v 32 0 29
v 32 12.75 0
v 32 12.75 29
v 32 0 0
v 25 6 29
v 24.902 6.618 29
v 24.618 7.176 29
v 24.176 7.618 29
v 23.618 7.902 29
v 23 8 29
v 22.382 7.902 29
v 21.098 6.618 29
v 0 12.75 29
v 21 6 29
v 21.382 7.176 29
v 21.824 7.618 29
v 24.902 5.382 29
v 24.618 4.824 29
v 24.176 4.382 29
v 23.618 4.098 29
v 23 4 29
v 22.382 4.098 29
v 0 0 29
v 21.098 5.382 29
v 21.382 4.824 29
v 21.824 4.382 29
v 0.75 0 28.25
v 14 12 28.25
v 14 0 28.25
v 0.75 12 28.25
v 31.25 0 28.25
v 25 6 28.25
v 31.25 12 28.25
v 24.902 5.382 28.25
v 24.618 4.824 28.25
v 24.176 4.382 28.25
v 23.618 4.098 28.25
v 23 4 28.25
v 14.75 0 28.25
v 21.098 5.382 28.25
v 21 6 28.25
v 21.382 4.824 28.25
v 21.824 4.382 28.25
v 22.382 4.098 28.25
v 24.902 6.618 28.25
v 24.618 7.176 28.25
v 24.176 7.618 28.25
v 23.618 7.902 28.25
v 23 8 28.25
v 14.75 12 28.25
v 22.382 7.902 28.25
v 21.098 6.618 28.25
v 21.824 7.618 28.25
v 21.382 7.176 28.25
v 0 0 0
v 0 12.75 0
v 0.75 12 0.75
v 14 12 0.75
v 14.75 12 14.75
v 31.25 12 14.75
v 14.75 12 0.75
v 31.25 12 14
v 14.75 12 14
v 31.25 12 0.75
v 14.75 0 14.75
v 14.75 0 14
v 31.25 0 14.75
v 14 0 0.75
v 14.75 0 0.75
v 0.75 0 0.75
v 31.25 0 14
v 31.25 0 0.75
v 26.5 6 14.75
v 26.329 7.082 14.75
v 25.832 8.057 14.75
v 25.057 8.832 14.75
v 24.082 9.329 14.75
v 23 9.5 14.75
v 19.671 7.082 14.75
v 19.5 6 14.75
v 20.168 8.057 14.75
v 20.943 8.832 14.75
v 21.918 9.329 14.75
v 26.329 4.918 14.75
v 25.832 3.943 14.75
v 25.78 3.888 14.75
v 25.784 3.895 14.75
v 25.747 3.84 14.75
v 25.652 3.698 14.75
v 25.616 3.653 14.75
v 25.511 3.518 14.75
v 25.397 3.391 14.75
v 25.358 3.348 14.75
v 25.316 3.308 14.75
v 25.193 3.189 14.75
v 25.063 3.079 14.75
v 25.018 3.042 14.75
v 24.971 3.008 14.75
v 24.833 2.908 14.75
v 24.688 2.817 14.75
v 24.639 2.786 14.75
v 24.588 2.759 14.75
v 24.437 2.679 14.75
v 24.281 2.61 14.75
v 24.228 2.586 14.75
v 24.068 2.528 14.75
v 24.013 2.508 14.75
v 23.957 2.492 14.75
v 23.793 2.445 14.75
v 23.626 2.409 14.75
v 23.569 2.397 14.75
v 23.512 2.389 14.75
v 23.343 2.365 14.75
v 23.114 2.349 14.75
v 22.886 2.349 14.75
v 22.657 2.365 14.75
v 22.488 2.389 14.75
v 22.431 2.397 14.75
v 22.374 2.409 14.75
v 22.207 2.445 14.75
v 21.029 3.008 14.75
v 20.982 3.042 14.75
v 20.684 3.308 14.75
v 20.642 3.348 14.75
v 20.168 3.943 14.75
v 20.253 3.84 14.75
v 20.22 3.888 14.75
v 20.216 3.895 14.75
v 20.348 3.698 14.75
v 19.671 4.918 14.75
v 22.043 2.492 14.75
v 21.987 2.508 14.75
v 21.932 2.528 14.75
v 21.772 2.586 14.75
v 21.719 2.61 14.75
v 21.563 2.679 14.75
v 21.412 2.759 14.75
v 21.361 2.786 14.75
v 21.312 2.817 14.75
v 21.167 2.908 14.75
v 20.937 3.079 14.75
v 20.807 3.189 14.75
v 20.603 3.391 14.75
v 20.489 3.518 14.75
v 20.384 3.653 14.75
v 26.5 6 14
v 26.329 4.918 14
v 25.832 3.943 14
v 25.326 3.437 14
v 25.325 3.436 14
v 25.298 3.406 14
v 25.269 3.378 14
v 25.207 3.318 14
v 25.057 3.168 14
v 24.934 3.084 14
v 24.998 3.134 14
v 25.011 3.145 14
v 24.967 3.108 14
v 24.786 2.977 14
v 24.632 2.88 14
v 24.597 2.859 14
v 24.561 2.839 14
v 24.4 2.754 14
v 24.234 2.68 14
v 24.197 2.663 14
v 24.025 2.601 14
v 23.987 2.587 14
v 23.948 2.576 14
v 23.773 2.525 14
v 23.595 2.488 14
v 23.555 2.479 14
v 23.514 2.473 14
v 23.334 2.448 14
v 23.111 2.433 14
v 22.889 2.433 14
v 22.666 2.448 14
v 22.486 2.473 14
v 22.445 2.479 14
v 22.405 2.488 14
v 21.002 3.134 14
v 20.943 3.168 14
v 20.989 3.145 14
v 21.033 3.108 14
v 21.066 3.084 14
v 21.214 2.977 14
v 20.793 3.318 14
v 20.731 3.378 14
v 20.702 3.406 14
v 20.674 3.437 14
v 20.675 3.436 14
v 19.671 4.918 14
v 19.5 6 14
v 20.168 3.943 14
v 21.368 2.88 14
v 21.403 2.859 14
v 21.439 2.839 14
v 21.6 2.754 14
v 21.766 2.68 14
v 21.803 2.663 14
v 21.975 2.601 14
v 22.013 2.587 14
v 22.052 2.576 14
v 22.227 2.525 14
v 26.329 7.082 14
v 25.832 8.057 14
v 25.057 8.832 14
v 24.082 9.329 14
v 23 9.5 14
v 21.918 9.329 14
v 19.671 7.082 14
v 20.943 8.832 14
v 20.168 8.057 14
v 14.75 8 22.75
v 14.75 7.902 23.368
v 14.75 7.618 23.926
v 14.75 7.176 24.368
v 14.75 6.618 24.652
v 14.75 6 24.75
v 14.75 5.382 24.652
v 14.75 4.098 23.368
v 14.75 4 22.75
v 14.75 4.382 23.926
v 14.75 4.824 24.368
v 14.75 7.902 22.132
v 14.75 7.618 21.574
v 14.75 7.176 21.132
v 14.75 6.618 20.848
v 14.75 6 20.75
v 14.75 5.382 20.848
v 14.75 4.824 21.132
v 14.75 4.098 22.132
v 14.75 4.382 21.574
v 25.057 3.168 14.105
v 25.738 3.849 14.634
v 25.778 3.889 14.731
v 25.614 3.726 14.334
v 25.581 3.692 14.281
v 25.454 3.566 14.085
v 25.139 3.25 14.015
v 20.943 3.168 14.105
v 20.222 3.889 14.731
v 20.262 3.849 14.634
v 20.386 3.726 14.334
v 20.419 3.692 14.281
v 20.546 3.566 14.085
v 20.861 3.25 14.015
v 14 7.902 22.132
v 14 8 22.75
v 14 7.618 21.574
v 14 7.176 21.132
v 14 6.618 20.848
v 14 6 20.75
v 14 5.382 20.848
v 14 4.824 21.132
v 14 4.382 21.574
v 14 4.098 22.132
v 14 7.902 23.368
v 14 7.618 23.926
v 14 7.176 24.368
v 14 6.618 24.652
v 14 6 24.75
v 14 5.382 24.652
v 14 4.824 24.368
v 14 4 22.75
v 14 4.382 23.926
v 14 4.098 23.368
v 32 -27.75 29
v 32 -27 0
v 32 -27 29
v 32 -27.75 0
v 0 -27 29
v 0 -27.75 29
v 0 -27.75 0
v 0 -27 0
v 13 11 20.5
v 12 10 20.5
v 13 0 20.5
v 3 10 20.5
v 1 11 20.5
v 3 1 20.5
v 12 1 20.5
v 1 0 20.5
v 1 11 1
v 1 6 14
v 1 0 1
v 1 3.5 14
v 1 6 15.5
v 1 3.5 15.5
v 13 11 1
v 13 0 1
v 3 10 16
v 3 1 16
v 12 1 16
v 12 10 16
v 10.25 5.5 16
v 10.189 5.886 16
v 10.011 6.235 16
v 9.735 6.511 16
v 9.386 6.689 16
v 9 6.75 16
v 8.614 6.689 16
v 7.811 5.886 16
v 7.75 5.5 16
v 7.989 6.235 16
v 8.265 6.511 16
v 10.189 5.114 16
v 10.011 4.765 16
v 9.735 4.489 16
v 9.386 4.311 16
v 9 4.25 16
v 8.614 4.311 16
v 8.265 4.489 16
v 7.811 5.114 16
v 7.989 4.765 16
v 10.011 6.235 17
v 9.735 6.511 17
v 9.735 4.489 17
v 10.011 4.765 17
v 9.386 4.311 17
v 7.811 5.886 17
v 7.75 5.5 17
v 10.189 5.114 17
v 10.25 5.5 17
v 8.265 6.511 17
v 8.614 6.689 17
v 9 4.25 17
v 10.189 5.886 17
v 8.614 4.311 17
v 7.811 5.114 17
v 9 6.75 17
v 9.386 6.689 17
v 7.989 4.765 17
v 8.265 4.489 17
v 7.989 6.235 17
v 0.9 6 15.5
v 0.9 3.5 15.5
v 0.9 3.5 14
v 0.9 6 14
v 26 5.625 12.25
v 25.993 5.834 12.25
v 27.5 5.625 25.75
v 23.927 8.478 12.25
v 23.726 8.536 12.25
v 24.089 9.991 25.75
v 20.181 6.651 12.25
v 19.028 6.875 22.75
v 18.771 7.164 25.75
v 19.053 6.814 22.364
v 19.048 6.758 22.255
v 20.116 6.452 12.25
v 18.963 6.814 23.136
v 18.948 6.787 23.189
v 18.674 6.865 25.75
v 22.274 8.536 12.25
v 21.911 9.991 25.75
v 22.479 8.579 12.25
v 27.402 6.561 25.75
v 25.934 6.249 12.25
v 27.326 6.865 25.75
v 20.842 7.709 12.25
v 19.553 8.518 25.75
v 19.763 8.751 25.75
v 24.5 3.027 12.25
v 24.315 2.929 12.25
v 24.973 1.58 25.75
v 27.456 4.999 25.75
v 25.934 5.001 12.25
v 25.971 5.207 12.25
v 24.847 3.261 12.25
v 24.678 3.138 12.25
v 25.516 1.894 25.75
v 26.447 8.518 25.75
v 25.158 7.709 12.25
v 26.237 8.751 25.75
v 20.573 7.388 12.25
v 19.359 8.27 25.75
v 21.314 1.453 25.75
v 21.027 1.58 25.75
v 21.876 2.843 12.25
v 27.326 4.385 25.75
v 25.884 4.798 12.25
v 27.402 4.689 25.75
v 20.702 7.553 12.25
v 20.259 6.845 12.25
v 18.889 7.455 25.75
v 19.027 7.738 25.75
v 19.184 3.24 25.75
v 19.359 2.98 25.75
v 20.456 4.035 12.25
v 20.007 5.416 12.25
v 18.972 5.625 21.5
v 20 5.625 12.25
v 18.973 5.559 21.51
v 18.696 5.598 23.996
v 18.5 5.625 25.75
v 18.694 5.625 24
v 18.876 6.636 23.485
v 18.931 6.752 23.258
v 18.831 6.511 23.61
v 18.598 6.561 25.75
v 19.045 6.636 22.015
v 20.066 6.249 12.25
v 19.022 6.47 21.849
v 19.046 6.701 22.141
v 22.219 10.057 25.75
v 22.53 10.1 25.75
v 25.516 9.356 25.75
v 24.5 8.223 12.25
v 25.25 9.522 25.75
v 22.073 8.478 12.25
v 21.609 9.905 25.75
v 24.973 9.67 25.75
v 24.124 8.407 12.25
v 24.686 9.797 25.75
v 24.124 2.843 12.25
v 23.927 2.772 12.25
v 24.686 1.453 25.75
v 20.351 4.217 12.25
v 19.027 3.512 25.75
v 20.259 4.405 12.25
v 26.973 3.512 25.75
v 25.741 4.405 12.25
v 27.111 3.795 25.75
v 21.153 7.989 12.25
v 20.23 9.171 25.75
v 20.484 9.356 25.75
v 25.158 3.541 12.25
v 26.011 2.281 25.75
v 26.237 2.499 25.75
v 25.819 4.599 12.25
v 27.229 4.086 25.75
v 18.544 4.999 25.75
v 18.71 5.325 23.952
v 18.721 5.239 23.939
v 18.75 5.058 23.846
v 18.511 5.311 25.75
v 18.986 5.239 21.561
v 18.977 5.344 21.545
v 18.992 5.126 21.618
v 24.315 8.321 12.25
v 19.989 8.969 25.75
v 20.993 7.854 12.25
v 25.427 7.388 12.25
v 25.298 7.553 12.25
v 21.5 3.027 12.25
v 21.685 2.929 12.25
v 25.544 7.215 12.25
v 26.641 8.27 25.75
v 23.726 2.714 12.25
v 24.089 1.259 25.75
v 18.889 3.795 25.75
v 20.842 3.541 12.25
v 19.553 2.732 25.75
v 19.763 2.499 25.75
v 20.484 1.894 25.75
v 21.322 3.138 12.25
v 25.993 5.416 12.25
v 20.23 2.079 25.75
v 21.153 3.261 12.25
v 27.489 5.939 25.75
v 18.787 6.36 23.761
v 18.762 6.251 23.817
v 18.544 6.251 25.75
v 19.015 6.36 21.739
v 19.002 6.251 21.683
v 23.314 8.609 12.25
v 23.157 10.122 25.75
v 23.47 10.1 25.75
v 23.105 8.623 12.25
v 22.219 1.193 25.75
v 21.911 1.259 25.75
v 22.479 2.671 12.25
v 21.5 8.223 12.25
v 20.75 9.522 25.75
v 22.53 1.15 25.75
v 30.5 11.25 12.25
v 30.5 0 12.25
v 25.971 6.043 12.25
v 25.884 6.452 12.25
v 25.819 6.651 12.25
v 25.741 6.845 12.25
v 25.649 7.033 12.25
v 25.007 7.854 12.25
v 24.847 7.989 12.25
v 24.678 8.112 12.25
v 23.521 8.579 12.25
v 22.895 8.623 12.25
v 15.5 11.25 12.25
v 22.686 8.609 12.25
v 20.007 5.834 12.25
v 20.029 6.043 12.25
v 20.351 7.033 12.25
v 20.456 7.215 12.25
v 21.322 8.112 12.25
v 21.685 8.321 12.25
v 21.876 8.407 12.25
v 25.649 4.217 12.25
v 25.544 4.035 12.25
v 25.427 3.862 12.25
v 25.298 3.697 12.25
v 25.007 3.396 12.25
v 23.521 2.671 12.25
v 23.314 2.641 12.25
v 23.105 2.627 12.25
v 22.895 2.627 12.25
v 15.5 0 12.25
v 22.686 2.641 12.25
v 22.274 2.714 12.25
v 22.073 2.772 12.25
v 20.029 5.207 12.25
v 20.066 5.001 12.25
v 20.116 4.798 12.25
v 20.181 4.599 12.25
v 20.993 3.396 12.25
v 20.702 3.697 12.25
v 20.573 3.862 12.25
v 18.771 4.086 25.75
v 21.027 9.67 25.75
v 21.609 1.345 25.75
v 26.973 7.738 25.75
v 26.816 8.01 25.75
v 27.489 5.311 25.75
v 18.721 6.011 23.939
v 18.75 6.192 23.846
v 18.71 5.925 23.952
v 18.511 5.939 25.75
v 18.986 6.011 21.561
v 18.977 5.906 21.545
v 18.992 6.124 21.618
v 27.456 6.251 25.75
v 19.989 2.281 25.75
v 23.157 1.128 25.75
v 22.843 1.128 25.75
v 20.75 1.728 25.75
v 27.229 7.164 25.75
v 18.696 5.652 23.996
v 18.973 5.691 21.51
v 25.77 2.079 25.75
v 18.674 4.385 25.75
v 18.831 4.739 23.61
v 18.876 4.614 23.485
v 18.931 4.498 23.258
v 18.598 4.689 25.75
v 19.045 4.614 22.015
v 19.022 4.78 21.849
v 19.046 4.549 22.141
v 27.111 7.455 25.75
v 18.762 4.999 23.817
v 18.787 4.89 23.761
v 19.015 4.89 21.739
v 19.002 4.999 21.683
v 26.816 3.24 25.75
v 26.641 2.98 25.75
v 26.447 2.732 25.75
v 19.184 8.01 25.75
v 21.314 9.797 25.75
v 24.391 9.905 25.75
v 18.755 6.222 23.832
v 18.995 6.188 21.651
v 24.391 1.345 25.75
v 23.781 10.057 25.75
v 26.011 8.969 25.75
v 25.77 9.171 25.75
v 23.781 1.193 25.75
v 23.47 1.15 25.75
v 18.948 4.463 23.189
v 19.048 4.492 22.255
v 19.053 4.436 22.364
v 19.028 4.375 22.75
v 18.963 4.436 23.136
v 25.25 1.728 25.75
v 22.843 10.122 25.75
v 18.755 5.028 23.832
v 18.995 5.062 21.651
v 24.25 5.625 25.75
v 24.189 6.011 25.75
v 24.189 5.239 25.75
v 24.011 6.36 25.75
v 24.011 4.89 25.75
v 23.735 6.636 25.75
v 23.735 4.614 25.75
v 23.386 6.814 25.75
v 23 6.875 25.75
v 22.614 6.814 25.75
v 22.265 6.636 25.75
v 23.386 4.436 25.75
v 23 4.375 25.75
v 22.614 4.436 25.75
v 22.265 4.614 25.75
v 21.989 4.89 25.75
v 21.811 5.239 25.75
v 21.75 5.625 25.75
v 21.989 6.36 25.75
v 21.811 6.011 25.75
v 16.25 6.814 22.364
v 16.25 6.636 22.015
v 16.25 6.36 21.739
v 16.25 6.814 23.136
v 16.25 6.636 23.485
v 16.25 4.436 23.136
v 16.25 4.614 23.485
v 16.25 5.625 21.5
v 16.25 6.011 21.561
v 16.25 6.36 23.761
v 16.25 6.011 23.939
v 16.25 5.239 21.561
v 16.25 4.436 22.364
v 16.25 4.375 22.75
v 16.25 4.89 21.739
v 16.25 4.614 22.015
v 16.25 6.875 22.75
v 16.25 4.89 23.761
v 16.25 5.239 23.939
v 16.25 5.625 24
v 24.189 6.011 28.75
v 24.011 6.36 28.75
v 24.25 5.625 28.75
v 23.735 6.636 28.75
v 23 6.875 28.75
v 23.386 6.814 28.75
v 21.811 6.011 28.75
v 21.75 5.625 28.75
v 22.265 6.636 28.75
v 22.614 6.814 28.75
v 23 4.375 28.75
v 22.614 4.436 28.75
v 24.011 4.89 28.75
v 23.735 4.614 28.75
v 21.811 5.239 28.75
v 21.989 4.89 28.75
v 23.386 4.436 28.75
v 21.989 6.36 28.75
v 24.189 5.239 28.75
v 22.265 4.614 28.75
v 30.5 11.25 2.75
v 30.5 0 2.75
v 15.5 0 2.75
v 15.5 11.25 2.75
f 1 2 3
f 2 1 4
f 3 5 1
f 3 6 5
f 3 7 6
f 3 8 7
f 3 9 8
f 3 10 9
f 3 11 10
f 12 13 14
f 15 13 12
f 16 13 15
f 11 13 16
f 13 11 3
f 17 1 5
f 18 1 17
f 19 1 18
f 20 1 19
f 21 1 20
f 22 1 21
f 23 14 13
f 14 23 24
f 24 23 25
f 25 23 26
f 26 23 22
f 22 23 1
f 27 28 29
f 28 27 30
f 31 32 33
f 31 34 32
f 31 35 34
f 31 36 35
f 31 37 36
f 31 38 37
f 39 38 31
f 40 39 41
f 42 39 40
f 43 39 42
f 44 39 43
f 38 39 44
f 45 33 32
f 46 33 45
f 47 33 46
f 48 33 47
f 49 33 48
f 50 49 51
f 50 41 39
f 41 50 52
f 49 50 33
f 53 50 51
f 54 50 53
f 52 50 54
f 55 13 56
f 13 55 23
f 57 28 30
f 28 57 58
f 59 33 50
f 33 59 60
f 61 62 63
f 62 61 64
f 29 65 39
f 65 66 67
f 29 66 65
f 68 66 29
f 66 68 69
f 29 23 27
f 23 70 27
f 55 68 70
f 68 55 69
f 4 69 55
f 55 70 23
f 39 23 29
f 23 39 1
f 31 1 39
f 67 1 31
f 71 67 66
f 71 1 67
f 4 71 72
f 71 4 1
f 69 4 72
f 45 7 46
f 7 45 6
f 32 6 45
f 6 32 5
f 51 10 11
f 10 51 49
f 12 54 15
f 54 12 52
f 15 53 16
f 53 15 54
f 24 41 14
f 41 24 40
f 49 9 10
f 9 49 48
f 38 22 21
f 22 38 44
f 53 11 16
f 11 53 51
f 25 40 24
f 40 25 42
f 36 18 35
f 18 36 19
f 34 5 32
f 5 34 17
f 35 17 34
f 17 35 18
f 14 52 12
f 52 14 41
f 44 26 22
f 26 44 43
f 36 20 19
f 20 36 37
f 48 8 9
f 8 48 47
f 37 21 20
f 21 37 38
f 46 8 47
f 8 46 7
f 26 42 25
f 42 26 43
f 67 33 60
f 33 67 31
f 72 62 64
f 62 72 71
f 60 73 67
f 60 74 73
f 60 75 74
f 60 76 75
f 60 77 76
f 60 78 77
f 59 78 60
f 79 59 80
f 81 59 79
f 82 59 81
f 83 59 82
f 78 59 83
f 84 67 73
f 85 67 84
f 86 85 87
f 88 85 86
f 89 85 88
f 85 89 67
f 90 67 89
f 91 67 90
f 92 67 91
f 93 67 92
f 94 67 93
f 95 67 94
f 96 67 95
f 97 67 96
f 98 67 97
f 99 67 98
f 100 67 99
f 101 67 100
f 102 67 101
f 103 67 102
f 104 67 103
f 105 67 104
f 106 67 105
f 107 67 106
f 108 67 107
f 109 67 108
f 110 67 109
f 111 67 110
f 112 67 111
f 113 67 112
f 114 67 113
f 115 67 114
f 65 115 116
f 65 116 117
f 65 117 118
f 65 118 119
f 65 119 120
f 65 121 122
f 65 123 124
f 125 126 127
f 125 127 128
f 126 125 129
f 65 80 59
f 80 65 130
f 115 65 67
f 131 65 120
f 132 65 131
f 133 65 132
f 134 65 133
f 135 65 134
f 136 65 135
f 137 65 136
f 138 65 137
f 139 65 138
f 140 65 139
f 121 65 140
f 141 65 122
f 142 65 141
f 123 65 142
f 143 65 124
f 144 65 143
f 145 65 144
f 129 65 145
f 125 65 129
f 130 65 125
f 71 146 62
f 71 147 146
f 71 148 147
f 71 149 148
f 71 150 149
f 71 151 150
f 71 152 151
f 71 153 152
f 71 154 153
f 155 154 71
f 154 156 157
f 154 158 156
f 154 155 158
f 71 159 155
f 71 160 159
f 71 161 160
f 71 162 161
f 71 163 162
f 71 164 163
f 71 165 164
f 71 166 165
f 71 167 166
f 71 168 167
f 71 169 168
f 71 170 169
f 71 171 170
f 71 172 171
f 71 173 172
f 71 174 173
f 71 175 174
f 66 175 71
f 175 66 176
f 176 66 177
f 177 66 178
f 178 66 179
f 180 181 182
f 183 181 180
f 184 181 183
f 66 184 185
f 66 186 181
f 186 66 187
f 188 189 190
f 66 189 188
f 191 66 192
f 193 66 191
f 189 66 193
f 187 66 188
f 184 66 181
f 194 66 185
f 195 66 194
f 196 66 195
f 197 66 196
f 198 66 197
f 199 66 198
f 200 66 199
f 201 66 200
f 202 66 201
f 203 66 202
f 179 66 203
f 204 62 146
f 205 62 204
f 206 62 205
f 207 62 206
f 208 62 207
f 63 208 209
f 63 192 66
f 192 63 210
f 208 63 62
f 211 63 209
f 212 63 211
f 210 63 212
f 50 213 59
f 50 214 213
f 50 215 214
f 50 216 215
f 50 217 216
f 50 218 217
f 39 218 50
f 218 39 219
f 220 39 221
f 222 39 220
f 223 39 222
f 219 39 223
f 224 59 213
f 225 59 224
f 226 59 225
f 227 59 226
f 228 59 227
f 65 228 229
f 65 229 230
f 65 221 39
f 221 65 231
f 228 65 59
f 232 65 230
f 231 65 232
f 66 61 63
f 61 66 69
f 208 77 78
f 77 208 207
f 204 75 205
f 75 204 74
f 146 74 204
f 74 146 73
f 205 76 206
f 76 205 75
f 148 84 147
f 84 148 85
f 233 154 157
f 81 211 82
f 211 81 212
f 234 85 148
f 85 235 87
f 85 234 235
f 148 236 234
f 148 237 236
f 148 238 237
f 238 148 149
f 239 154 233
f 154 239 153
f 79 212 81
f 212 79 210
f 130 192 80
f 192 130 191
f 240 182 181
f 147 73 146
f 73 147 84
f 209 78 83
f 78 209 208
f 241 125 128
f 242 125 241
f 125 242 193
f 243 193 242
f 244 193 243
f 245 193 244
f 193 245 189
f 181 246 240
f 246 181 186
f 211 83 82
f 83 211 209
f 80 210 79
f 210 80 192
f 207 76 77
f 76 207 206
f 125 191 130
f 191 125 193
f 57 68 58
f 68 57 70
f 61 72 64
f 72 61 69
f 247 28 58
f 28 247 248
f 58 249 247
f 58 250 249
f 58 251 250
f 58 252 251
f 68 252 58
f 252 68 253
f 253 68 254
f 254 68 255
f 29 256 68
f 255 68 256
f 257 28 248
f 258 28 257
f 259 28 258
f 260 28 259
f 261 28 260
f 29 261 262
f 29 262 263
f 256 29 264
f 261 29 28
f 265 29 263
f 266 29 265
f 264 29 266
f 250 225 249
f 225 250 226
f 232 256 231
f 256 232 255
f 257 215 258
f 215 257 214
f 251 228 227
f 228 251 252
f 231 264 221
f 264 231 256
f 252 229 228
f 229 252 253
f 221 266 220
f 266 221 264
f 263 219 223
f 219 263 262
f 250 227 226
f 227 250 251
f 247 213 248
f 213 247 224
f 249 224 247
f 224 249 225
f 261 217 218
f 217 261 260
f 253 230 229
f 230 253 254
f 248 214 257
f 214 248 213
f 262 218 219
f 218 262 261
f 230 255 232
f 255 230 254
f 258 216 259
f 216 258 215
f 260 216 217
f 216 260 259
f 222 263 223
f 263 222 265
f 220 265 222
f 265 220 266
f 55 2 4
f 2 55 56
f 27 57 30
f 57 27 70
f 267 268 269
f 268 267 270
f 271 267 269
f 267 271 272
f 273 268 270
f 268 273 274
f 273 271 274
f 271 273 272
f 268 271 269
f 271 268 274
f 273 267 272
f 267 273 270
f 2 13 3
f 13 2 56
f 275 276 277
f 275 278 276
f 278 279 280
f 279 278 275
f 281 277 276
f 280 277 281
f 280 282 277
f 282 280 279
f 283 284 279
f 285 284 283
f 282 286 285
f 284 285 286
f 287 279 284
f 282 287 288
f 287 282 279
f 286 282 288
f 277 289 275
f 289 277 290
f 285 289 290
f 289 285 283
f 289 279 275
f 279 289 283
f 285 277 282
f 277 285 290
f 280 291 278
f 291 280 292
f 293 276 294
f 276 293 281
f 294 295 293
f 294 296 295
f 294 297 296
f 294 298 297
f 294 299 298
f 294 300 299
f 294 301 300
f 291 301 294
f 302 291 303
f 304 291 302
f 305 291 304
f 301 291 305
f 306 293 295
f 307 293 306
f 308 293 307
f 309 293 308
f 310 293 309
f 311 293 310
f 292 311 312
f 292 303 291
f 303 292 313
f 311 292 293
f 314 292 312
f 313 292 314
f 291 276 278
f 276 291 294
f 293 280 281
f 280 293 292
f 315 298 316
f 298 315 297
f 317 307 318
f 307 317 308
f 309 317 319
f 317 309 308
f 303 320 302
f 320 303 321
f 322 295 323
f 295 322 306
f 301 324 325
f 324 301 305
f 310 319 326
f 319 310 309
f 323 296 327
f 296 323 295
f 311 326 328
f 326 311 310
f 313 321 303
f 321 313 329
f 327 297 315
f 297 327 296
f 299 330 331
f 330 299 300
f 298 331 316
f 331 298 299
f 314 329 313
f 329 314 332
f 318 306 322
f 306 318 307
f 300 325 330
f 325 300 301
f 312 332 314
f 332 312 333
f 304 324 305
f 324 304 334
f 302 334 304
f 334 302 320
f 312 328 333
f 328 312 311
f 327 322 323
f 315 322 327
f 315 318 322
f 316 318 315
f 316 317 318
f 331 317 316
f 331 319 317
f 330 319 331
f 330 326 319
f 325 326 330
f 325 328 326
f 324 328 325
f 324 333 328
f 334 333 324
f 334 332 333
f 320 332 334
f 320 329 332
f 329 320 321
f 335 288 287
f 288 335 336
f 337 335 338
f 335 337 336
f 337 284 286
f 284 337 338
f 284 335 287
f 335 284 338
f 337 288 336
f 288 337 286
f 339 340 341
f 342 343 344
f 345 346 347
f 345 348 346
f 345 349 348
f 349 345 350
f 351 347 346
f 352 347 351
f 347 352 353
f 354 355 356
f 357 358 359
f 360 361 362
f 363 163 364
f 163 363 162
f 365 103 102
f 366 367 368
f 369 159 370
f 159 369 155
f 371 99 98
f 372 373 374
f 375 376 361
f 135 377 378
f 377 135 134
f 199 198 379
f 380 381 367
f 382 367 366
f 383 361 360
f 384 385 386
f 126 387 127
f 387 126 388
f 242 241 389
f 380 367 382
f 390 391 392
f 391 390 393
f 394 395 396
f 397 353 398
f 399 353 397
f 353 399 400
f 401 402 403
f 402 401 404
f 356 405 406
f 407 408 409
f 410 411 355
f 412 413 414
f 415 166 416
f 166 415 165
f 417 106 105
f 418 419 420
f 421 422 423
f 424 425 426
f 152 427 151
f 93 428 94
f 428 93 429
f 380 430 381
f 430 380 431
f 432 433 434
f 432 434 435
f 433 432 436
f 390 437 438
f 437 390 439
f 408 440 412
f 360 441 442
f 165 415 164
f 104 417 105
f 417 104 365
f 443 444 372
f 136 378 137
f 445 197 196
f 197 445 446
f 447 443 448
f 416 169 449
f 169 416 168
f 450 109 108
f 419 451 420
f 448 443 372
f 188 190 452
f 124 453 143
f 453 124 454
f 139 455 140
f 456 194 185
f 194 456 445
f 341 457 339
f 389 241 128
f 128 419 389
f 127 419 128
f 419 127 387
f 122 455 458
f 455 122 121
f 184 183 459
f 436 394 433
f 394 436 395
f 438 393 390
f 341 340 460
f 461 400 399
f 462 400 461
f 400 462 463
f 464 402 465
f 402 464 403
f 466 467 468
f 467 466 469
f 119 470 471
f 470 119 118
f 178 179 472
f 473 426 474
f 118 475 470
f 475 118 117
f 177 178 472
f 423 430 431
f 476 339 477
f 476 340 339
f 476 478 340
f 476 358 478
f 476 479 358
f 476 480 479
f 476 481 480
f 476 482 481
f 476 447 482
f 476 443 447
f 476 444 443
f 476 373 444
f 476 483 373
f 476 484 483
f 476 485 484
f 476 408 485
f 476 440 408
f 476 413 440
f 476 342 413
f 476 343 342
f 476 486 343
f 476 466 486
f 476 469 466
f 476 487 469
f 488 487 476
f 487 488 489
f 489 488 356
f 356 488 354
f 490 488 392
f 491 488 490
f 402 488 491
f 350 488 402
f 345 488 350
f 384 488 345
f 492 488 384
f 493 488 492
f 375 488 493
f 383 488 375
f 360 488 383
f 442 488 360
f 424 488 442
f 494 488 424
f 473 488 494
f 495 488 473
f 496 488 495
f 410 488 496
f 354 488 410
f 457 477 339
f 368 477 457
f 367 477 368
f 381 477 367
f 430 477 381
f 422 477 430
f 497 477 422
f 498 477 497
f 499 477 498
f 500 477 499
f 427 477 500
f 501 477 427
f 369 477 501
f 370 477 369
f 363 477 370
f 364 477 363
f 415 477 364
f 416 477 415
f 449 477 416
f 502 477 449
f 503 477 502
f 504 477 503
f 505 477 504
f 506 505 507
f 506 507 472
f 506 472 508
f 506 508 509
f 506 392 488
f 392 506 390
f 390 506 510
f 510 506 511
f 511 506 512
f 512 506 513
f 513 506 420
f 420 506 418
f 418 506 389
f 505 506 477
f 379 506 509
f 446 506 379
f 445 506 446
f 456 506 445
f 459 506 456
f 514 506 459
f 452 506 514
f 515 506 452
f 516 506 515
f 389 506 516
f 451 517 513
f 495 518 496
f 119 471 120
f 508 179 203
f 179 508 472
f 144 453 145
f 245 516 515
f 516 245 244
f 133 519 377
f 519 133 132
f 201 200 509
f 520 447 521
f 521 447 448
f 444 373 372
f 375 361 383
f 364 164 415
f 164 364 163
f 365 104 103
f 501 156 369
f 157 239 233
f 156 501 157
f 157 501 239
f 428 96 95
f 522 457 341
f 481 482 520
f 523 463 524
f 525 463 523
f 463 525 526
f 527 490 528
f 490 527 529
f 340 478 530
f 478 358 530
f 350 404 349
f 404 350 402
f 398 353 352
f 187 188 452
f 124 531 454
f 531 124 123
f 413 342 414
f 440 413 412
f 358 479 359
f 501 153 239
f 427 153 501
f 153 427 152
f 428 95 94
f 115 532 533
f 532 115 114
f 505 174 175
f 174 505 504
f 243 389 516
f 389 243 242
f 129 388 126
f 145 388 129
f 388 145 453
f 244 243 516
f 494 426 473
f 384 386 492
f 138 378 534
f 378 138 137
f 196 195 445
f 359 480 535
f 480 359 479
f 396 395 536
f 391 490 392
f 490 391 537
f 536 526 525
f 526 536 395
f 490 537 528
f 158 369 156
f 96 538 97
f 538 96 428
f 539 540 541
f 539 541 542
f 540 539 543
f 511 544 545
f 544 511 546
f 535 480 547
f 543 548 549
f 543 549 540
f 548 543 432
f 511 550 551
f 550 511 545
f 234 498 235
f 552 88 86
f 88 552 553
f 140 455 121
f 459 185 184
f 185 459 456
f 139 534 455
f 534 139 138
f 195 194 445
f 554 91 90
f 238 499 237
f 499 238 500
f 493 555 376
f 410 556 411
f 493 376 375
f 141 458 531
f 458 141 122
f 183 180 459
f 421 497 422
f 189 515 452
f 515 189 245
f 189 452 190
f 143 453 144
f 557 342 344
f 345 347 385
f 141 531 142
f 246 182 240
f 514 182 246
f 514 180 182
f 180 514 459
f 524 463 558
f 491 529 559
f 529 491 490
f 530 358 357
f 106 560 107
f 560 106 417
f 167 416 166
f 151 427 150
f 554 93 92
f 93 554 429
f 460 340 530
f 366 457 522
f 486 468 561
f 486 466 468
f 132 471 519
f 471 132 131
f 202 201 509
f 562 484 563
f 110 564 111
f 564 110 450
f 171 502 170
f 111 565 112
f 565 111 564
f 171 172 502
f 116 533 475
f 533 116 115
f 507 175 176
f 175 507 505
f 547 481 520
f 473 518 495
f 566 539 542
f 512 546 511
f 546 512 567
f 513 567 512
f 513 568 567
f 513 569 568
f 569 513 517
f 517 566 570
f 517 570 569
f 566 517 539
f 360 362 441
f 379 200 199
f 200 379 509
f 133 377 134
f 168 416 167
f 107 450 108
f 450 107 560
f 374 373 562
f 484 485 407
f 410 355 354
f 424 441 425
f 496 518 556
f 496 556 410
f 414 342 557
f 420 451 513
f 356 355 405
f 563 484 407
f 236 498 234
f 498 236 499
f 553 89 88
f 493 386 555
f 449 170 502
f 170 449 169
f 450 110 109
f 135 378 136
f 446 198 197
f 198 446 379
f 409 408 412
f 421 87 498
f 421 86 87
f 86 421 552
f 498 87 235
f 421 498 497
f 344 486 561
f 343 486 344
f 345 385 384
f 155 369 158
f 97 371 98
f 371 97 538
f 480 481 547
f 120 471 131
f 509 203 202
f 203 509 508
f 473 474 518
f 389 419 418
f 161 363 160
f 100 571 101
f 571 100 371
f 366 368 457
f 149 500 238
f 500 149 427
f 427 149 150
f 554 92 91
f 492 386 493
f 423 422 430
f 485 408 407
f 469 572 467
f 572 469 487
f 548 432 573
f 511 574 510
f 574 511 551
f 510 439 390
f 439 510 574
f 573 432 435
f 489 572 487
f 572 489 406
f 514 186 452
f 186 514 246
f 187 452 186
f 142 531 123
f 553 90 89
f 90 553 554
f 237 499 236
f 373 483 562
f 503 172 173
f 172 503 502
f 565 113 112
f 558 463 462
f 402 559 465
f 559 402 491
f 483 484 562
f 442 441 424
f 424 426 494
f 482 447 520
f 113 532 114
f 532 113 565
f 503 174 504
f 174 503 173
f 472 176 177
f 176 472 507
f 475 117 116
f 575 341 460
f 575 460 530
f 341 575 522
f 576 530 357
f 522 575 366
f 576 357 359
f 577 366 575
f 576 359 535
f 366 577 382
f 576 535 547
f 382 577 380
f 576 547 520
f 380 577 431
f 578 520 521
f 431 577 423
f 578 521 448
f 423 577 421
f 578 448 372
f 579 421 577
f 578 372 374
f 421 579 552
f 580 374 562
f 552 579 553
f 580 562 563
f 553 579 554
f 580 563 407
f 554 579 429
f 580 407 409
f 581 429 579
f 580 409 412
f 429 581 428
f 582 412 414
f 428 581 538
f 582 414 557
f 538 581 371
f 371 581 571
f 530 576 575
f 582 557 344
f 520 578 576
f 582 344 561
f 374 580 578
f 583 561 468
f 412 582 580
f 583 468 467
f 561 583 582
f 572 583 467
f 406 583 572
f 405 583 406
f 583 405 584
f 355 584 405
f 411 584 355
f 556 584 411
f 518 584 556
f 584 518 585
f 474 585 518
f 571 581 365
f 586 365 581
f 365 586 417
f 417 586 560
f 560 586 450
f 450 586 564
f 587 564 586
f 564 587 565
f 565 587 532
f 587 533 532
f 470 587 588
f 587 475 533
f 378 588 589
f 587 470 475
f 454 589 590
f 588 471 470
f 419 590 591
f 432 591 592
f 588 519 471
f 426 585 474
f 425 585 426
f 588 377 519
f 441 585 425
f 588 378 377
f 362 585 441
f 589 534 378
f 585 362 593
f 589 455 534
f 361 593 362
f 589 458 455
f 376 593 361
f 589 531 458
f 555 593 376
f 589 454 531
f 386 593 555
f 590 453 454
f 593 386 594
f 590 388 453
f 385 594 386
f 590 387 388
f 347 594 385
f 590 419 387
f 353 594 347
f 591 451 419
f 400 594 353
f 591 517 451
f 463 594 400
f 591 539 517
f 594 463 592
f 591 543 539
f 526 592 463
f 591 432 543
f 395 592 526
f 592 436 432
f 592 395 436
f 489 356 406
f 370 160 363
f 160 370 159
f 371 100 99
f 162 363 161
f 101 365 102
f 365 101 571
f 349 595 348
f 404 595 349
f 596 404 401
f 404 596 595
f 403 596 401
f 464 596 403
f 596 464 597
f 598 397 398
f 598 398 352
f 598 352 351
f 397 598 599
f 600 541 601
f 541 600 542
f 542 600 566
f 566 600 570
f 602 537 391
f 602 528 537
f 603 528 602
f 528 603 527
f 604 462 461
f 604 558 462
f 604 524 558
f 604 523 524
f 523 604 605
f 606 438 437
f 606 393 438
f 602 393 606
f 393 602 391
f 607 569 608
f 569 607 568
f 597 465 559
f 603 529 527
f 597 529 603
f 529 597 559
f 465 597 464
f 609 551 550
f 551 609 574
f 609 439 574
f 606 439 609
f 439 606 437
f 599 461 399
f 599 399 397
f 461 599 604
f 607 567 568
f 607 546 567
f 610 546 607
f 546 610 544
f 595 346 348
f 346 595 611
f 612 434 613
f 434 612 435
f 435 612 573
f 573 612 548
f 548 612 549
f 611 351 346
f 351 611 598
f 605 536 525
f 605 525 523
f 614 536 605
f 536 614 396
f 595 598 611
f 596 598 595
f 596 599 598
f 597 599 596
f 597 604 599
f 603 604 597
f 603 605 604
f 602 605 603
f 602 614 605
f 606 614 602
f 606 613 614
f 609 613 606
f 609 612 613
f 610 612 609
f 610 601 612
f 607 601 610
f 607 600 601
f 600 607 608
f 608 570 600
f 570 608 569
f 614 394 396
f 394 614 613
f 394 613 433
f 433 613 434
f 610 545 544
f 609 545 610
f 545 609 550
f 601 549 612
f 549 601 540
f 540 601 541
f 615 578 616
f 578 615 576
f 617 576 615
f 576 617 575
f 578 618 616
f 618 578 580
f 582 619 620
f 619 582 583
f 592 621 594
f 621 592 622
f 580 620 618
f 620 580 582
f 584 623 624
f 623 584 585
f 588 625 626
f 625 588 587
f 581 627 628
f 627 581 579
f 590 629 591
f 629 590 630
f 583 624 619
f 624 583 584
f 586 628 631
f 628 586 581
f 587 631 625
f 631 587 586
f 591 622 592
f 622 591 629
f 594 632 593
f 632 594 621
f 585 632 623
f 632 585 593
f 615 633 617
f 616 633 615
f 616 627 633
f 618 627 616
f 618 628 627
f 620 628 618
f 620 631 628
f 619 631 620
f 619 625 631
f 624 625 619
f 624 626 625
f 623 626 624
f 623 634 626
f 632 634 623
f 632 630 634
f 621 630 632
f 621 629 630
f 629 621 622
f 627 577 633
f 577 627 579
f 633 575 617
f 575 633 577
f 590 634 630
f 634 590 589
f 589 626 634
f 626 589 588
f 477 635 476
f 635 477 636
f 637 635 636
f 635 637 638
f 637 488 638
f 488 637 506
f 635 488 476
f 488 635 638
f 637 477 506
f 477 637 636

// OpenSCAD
module shopVac() {
    
    vacWidth = 19.5;
    vacDepth = 11;
    vacHeight = 12;
    
    inflowHeight = 4;
    inflowInset = 3.5;

    switchWidth = 1.5;
    switchDepth = 2.5;
    switchHeight = 1; // doesn't really matter, just needs to be consistent
    switchDepthOffset = 3.5;
    switchWidthOffset = 6.5;

    
    color("orange", 1) {
        difference() {
            cube([vacWidth, vacDepth, vacHeight]);
            translate([vacWidth - inflowInset - 1, 1, 1]) {
                cube([inflowInset + 2, vacDepth - 2, inflowHeight + 5]);
            }            
        }
    }
    color("black", 1.0) {
        translate([vacWidth - inflowInset - 1, vacDepth / 2, inflowHeight]) {
            rotate([0,90,0]) {
                cylinder(h = 1, r = 1.25, $fn = 20);
            }
        }
    }
    color("grey", 1.0) {
        translate([vacWidth - switchWidthOffset, switchDepthOffset, vacHeight - switchHeight + 0.1]) {
            cube([switchWidth, switchDepth, switchHeight]);
        }
    }
}


module chipSystem() {
    
    chipWidth = 15;
    chipHeight = 9.5;
    chipDepth = 11.25;
    
    deputyConeHeight = 13.5;
    deputyBottomRadius = 3;
    deputyTopRadius = 4.5;
    
    outflowVerticalOffset = -1.5;
    outflowHorizontalOffset = 1.75;
    outflowLengthFromCenter = 4;
    
    
    color("white", 0.85) {
        // Tupperware (airtight) chip collector
        cube([chipWidth, chipDepth, chipHeight]);
        // Cyclonic "dust deputy" from Oenida Air Systems
        translate([chipWidth/2, chipDepth/2, chipHeight]) {
            cylinder(
                h = deputyConeHeight,
                r1 = deputyBottomRadius,
                r2 = deputyTopRadius,
                $fn = 90
            );
            translate([deputyTopRadius * -1.5, 0, deputyConeHeight - 3]) {
                rotate([0, 90, 0]) {
                    cylinder(h = 5, r = 1.25, $fn = 20);
                }
            }
            translate([0, 0, deputyConeHeight]) {
                rotate([0, 0, 0]) {
                    cylinder(h = 3, r = 1.25, $fn = 20);
                }
            }
        }
    }
}

module cabinet() {
    overallDepth = 12;
    overallWidth = 32;
    overallHeight = 29;
        // cube([overallWidth, overallDepth, overallHeight]);
        
        // bottom
        color("green", 1.0) {
            cube([overallWidth, overallDepth, 0.75]);
        }
        // top
        color("green", 1.0) {
            translate([0,0,overallHeight - 0.75]){
                difference() {
                    cube([overallWidth, overallDepth, 0.75]);
                    translate([23,overallDepth/2,-0.125]) {
                        cylinder(h = 1, r = 2, $fn = 20);
                    }
                }
            }
        }
        // dust deputy support
        // (keeps chip bin suspended just enough so that
        // it can be dropped from the lid and removed)
        color("green", 1.0) {
            translate([14 + 0.75,0,14]){
                difference() {
                    cube([16.5, overallDepth, 0.75]);
                    translate([8.25,overallDepth/2,-0.125]) {
                        cylinder(h = 1, r = 3.5, $fn = 20);
                    }
                }
            }
        }
        
        // side 1
        color("lightgreen") {
            translate([0,0,0.75]) {
                cube([0.75, overallDepth, overallHeight - (0.75 * 2)]);
            }
        }
        // side 2
        color("lightgreen") {
            translate([overallWidth - 0.75,0,0.75]) {
                cube([0.75, overallDepth, overallHeight - (0.75 * 2)]);
            }
        }
        // center divider
        color("lightgreen") {
            translate([14,0,0.75]) {
                difference() {
                    cube([0.75, overallDepth, overallHeight - (0.75 * 2)]);                    
                    translate([-0.25,overallDepth /2,22]){
                        rotate([0,90,0]) {
                            cylinder(h = 1.25, r = 2, $fn = 20);
                        }
                    }
                }

            }
        }
        // front
        color("darkgreen") {
            translate([0,-0.75 - 027,0]){
                cube([overallWidth, 0.75, overallHeight]);
            }
        }
        // back
        color("darkgreen") {
            translate([0,12,0]){
                cube([overallWidth, 0.75, overallHeight]);
            }
        }
}

cabinet();


translate([13, 0, 1]) {
    rotate([0,-90,0]){
        shopVac();
    }
}
translate([15.5, 0, 2 + 0.75]) {
    chipSystem();
}


echo(version=version());
